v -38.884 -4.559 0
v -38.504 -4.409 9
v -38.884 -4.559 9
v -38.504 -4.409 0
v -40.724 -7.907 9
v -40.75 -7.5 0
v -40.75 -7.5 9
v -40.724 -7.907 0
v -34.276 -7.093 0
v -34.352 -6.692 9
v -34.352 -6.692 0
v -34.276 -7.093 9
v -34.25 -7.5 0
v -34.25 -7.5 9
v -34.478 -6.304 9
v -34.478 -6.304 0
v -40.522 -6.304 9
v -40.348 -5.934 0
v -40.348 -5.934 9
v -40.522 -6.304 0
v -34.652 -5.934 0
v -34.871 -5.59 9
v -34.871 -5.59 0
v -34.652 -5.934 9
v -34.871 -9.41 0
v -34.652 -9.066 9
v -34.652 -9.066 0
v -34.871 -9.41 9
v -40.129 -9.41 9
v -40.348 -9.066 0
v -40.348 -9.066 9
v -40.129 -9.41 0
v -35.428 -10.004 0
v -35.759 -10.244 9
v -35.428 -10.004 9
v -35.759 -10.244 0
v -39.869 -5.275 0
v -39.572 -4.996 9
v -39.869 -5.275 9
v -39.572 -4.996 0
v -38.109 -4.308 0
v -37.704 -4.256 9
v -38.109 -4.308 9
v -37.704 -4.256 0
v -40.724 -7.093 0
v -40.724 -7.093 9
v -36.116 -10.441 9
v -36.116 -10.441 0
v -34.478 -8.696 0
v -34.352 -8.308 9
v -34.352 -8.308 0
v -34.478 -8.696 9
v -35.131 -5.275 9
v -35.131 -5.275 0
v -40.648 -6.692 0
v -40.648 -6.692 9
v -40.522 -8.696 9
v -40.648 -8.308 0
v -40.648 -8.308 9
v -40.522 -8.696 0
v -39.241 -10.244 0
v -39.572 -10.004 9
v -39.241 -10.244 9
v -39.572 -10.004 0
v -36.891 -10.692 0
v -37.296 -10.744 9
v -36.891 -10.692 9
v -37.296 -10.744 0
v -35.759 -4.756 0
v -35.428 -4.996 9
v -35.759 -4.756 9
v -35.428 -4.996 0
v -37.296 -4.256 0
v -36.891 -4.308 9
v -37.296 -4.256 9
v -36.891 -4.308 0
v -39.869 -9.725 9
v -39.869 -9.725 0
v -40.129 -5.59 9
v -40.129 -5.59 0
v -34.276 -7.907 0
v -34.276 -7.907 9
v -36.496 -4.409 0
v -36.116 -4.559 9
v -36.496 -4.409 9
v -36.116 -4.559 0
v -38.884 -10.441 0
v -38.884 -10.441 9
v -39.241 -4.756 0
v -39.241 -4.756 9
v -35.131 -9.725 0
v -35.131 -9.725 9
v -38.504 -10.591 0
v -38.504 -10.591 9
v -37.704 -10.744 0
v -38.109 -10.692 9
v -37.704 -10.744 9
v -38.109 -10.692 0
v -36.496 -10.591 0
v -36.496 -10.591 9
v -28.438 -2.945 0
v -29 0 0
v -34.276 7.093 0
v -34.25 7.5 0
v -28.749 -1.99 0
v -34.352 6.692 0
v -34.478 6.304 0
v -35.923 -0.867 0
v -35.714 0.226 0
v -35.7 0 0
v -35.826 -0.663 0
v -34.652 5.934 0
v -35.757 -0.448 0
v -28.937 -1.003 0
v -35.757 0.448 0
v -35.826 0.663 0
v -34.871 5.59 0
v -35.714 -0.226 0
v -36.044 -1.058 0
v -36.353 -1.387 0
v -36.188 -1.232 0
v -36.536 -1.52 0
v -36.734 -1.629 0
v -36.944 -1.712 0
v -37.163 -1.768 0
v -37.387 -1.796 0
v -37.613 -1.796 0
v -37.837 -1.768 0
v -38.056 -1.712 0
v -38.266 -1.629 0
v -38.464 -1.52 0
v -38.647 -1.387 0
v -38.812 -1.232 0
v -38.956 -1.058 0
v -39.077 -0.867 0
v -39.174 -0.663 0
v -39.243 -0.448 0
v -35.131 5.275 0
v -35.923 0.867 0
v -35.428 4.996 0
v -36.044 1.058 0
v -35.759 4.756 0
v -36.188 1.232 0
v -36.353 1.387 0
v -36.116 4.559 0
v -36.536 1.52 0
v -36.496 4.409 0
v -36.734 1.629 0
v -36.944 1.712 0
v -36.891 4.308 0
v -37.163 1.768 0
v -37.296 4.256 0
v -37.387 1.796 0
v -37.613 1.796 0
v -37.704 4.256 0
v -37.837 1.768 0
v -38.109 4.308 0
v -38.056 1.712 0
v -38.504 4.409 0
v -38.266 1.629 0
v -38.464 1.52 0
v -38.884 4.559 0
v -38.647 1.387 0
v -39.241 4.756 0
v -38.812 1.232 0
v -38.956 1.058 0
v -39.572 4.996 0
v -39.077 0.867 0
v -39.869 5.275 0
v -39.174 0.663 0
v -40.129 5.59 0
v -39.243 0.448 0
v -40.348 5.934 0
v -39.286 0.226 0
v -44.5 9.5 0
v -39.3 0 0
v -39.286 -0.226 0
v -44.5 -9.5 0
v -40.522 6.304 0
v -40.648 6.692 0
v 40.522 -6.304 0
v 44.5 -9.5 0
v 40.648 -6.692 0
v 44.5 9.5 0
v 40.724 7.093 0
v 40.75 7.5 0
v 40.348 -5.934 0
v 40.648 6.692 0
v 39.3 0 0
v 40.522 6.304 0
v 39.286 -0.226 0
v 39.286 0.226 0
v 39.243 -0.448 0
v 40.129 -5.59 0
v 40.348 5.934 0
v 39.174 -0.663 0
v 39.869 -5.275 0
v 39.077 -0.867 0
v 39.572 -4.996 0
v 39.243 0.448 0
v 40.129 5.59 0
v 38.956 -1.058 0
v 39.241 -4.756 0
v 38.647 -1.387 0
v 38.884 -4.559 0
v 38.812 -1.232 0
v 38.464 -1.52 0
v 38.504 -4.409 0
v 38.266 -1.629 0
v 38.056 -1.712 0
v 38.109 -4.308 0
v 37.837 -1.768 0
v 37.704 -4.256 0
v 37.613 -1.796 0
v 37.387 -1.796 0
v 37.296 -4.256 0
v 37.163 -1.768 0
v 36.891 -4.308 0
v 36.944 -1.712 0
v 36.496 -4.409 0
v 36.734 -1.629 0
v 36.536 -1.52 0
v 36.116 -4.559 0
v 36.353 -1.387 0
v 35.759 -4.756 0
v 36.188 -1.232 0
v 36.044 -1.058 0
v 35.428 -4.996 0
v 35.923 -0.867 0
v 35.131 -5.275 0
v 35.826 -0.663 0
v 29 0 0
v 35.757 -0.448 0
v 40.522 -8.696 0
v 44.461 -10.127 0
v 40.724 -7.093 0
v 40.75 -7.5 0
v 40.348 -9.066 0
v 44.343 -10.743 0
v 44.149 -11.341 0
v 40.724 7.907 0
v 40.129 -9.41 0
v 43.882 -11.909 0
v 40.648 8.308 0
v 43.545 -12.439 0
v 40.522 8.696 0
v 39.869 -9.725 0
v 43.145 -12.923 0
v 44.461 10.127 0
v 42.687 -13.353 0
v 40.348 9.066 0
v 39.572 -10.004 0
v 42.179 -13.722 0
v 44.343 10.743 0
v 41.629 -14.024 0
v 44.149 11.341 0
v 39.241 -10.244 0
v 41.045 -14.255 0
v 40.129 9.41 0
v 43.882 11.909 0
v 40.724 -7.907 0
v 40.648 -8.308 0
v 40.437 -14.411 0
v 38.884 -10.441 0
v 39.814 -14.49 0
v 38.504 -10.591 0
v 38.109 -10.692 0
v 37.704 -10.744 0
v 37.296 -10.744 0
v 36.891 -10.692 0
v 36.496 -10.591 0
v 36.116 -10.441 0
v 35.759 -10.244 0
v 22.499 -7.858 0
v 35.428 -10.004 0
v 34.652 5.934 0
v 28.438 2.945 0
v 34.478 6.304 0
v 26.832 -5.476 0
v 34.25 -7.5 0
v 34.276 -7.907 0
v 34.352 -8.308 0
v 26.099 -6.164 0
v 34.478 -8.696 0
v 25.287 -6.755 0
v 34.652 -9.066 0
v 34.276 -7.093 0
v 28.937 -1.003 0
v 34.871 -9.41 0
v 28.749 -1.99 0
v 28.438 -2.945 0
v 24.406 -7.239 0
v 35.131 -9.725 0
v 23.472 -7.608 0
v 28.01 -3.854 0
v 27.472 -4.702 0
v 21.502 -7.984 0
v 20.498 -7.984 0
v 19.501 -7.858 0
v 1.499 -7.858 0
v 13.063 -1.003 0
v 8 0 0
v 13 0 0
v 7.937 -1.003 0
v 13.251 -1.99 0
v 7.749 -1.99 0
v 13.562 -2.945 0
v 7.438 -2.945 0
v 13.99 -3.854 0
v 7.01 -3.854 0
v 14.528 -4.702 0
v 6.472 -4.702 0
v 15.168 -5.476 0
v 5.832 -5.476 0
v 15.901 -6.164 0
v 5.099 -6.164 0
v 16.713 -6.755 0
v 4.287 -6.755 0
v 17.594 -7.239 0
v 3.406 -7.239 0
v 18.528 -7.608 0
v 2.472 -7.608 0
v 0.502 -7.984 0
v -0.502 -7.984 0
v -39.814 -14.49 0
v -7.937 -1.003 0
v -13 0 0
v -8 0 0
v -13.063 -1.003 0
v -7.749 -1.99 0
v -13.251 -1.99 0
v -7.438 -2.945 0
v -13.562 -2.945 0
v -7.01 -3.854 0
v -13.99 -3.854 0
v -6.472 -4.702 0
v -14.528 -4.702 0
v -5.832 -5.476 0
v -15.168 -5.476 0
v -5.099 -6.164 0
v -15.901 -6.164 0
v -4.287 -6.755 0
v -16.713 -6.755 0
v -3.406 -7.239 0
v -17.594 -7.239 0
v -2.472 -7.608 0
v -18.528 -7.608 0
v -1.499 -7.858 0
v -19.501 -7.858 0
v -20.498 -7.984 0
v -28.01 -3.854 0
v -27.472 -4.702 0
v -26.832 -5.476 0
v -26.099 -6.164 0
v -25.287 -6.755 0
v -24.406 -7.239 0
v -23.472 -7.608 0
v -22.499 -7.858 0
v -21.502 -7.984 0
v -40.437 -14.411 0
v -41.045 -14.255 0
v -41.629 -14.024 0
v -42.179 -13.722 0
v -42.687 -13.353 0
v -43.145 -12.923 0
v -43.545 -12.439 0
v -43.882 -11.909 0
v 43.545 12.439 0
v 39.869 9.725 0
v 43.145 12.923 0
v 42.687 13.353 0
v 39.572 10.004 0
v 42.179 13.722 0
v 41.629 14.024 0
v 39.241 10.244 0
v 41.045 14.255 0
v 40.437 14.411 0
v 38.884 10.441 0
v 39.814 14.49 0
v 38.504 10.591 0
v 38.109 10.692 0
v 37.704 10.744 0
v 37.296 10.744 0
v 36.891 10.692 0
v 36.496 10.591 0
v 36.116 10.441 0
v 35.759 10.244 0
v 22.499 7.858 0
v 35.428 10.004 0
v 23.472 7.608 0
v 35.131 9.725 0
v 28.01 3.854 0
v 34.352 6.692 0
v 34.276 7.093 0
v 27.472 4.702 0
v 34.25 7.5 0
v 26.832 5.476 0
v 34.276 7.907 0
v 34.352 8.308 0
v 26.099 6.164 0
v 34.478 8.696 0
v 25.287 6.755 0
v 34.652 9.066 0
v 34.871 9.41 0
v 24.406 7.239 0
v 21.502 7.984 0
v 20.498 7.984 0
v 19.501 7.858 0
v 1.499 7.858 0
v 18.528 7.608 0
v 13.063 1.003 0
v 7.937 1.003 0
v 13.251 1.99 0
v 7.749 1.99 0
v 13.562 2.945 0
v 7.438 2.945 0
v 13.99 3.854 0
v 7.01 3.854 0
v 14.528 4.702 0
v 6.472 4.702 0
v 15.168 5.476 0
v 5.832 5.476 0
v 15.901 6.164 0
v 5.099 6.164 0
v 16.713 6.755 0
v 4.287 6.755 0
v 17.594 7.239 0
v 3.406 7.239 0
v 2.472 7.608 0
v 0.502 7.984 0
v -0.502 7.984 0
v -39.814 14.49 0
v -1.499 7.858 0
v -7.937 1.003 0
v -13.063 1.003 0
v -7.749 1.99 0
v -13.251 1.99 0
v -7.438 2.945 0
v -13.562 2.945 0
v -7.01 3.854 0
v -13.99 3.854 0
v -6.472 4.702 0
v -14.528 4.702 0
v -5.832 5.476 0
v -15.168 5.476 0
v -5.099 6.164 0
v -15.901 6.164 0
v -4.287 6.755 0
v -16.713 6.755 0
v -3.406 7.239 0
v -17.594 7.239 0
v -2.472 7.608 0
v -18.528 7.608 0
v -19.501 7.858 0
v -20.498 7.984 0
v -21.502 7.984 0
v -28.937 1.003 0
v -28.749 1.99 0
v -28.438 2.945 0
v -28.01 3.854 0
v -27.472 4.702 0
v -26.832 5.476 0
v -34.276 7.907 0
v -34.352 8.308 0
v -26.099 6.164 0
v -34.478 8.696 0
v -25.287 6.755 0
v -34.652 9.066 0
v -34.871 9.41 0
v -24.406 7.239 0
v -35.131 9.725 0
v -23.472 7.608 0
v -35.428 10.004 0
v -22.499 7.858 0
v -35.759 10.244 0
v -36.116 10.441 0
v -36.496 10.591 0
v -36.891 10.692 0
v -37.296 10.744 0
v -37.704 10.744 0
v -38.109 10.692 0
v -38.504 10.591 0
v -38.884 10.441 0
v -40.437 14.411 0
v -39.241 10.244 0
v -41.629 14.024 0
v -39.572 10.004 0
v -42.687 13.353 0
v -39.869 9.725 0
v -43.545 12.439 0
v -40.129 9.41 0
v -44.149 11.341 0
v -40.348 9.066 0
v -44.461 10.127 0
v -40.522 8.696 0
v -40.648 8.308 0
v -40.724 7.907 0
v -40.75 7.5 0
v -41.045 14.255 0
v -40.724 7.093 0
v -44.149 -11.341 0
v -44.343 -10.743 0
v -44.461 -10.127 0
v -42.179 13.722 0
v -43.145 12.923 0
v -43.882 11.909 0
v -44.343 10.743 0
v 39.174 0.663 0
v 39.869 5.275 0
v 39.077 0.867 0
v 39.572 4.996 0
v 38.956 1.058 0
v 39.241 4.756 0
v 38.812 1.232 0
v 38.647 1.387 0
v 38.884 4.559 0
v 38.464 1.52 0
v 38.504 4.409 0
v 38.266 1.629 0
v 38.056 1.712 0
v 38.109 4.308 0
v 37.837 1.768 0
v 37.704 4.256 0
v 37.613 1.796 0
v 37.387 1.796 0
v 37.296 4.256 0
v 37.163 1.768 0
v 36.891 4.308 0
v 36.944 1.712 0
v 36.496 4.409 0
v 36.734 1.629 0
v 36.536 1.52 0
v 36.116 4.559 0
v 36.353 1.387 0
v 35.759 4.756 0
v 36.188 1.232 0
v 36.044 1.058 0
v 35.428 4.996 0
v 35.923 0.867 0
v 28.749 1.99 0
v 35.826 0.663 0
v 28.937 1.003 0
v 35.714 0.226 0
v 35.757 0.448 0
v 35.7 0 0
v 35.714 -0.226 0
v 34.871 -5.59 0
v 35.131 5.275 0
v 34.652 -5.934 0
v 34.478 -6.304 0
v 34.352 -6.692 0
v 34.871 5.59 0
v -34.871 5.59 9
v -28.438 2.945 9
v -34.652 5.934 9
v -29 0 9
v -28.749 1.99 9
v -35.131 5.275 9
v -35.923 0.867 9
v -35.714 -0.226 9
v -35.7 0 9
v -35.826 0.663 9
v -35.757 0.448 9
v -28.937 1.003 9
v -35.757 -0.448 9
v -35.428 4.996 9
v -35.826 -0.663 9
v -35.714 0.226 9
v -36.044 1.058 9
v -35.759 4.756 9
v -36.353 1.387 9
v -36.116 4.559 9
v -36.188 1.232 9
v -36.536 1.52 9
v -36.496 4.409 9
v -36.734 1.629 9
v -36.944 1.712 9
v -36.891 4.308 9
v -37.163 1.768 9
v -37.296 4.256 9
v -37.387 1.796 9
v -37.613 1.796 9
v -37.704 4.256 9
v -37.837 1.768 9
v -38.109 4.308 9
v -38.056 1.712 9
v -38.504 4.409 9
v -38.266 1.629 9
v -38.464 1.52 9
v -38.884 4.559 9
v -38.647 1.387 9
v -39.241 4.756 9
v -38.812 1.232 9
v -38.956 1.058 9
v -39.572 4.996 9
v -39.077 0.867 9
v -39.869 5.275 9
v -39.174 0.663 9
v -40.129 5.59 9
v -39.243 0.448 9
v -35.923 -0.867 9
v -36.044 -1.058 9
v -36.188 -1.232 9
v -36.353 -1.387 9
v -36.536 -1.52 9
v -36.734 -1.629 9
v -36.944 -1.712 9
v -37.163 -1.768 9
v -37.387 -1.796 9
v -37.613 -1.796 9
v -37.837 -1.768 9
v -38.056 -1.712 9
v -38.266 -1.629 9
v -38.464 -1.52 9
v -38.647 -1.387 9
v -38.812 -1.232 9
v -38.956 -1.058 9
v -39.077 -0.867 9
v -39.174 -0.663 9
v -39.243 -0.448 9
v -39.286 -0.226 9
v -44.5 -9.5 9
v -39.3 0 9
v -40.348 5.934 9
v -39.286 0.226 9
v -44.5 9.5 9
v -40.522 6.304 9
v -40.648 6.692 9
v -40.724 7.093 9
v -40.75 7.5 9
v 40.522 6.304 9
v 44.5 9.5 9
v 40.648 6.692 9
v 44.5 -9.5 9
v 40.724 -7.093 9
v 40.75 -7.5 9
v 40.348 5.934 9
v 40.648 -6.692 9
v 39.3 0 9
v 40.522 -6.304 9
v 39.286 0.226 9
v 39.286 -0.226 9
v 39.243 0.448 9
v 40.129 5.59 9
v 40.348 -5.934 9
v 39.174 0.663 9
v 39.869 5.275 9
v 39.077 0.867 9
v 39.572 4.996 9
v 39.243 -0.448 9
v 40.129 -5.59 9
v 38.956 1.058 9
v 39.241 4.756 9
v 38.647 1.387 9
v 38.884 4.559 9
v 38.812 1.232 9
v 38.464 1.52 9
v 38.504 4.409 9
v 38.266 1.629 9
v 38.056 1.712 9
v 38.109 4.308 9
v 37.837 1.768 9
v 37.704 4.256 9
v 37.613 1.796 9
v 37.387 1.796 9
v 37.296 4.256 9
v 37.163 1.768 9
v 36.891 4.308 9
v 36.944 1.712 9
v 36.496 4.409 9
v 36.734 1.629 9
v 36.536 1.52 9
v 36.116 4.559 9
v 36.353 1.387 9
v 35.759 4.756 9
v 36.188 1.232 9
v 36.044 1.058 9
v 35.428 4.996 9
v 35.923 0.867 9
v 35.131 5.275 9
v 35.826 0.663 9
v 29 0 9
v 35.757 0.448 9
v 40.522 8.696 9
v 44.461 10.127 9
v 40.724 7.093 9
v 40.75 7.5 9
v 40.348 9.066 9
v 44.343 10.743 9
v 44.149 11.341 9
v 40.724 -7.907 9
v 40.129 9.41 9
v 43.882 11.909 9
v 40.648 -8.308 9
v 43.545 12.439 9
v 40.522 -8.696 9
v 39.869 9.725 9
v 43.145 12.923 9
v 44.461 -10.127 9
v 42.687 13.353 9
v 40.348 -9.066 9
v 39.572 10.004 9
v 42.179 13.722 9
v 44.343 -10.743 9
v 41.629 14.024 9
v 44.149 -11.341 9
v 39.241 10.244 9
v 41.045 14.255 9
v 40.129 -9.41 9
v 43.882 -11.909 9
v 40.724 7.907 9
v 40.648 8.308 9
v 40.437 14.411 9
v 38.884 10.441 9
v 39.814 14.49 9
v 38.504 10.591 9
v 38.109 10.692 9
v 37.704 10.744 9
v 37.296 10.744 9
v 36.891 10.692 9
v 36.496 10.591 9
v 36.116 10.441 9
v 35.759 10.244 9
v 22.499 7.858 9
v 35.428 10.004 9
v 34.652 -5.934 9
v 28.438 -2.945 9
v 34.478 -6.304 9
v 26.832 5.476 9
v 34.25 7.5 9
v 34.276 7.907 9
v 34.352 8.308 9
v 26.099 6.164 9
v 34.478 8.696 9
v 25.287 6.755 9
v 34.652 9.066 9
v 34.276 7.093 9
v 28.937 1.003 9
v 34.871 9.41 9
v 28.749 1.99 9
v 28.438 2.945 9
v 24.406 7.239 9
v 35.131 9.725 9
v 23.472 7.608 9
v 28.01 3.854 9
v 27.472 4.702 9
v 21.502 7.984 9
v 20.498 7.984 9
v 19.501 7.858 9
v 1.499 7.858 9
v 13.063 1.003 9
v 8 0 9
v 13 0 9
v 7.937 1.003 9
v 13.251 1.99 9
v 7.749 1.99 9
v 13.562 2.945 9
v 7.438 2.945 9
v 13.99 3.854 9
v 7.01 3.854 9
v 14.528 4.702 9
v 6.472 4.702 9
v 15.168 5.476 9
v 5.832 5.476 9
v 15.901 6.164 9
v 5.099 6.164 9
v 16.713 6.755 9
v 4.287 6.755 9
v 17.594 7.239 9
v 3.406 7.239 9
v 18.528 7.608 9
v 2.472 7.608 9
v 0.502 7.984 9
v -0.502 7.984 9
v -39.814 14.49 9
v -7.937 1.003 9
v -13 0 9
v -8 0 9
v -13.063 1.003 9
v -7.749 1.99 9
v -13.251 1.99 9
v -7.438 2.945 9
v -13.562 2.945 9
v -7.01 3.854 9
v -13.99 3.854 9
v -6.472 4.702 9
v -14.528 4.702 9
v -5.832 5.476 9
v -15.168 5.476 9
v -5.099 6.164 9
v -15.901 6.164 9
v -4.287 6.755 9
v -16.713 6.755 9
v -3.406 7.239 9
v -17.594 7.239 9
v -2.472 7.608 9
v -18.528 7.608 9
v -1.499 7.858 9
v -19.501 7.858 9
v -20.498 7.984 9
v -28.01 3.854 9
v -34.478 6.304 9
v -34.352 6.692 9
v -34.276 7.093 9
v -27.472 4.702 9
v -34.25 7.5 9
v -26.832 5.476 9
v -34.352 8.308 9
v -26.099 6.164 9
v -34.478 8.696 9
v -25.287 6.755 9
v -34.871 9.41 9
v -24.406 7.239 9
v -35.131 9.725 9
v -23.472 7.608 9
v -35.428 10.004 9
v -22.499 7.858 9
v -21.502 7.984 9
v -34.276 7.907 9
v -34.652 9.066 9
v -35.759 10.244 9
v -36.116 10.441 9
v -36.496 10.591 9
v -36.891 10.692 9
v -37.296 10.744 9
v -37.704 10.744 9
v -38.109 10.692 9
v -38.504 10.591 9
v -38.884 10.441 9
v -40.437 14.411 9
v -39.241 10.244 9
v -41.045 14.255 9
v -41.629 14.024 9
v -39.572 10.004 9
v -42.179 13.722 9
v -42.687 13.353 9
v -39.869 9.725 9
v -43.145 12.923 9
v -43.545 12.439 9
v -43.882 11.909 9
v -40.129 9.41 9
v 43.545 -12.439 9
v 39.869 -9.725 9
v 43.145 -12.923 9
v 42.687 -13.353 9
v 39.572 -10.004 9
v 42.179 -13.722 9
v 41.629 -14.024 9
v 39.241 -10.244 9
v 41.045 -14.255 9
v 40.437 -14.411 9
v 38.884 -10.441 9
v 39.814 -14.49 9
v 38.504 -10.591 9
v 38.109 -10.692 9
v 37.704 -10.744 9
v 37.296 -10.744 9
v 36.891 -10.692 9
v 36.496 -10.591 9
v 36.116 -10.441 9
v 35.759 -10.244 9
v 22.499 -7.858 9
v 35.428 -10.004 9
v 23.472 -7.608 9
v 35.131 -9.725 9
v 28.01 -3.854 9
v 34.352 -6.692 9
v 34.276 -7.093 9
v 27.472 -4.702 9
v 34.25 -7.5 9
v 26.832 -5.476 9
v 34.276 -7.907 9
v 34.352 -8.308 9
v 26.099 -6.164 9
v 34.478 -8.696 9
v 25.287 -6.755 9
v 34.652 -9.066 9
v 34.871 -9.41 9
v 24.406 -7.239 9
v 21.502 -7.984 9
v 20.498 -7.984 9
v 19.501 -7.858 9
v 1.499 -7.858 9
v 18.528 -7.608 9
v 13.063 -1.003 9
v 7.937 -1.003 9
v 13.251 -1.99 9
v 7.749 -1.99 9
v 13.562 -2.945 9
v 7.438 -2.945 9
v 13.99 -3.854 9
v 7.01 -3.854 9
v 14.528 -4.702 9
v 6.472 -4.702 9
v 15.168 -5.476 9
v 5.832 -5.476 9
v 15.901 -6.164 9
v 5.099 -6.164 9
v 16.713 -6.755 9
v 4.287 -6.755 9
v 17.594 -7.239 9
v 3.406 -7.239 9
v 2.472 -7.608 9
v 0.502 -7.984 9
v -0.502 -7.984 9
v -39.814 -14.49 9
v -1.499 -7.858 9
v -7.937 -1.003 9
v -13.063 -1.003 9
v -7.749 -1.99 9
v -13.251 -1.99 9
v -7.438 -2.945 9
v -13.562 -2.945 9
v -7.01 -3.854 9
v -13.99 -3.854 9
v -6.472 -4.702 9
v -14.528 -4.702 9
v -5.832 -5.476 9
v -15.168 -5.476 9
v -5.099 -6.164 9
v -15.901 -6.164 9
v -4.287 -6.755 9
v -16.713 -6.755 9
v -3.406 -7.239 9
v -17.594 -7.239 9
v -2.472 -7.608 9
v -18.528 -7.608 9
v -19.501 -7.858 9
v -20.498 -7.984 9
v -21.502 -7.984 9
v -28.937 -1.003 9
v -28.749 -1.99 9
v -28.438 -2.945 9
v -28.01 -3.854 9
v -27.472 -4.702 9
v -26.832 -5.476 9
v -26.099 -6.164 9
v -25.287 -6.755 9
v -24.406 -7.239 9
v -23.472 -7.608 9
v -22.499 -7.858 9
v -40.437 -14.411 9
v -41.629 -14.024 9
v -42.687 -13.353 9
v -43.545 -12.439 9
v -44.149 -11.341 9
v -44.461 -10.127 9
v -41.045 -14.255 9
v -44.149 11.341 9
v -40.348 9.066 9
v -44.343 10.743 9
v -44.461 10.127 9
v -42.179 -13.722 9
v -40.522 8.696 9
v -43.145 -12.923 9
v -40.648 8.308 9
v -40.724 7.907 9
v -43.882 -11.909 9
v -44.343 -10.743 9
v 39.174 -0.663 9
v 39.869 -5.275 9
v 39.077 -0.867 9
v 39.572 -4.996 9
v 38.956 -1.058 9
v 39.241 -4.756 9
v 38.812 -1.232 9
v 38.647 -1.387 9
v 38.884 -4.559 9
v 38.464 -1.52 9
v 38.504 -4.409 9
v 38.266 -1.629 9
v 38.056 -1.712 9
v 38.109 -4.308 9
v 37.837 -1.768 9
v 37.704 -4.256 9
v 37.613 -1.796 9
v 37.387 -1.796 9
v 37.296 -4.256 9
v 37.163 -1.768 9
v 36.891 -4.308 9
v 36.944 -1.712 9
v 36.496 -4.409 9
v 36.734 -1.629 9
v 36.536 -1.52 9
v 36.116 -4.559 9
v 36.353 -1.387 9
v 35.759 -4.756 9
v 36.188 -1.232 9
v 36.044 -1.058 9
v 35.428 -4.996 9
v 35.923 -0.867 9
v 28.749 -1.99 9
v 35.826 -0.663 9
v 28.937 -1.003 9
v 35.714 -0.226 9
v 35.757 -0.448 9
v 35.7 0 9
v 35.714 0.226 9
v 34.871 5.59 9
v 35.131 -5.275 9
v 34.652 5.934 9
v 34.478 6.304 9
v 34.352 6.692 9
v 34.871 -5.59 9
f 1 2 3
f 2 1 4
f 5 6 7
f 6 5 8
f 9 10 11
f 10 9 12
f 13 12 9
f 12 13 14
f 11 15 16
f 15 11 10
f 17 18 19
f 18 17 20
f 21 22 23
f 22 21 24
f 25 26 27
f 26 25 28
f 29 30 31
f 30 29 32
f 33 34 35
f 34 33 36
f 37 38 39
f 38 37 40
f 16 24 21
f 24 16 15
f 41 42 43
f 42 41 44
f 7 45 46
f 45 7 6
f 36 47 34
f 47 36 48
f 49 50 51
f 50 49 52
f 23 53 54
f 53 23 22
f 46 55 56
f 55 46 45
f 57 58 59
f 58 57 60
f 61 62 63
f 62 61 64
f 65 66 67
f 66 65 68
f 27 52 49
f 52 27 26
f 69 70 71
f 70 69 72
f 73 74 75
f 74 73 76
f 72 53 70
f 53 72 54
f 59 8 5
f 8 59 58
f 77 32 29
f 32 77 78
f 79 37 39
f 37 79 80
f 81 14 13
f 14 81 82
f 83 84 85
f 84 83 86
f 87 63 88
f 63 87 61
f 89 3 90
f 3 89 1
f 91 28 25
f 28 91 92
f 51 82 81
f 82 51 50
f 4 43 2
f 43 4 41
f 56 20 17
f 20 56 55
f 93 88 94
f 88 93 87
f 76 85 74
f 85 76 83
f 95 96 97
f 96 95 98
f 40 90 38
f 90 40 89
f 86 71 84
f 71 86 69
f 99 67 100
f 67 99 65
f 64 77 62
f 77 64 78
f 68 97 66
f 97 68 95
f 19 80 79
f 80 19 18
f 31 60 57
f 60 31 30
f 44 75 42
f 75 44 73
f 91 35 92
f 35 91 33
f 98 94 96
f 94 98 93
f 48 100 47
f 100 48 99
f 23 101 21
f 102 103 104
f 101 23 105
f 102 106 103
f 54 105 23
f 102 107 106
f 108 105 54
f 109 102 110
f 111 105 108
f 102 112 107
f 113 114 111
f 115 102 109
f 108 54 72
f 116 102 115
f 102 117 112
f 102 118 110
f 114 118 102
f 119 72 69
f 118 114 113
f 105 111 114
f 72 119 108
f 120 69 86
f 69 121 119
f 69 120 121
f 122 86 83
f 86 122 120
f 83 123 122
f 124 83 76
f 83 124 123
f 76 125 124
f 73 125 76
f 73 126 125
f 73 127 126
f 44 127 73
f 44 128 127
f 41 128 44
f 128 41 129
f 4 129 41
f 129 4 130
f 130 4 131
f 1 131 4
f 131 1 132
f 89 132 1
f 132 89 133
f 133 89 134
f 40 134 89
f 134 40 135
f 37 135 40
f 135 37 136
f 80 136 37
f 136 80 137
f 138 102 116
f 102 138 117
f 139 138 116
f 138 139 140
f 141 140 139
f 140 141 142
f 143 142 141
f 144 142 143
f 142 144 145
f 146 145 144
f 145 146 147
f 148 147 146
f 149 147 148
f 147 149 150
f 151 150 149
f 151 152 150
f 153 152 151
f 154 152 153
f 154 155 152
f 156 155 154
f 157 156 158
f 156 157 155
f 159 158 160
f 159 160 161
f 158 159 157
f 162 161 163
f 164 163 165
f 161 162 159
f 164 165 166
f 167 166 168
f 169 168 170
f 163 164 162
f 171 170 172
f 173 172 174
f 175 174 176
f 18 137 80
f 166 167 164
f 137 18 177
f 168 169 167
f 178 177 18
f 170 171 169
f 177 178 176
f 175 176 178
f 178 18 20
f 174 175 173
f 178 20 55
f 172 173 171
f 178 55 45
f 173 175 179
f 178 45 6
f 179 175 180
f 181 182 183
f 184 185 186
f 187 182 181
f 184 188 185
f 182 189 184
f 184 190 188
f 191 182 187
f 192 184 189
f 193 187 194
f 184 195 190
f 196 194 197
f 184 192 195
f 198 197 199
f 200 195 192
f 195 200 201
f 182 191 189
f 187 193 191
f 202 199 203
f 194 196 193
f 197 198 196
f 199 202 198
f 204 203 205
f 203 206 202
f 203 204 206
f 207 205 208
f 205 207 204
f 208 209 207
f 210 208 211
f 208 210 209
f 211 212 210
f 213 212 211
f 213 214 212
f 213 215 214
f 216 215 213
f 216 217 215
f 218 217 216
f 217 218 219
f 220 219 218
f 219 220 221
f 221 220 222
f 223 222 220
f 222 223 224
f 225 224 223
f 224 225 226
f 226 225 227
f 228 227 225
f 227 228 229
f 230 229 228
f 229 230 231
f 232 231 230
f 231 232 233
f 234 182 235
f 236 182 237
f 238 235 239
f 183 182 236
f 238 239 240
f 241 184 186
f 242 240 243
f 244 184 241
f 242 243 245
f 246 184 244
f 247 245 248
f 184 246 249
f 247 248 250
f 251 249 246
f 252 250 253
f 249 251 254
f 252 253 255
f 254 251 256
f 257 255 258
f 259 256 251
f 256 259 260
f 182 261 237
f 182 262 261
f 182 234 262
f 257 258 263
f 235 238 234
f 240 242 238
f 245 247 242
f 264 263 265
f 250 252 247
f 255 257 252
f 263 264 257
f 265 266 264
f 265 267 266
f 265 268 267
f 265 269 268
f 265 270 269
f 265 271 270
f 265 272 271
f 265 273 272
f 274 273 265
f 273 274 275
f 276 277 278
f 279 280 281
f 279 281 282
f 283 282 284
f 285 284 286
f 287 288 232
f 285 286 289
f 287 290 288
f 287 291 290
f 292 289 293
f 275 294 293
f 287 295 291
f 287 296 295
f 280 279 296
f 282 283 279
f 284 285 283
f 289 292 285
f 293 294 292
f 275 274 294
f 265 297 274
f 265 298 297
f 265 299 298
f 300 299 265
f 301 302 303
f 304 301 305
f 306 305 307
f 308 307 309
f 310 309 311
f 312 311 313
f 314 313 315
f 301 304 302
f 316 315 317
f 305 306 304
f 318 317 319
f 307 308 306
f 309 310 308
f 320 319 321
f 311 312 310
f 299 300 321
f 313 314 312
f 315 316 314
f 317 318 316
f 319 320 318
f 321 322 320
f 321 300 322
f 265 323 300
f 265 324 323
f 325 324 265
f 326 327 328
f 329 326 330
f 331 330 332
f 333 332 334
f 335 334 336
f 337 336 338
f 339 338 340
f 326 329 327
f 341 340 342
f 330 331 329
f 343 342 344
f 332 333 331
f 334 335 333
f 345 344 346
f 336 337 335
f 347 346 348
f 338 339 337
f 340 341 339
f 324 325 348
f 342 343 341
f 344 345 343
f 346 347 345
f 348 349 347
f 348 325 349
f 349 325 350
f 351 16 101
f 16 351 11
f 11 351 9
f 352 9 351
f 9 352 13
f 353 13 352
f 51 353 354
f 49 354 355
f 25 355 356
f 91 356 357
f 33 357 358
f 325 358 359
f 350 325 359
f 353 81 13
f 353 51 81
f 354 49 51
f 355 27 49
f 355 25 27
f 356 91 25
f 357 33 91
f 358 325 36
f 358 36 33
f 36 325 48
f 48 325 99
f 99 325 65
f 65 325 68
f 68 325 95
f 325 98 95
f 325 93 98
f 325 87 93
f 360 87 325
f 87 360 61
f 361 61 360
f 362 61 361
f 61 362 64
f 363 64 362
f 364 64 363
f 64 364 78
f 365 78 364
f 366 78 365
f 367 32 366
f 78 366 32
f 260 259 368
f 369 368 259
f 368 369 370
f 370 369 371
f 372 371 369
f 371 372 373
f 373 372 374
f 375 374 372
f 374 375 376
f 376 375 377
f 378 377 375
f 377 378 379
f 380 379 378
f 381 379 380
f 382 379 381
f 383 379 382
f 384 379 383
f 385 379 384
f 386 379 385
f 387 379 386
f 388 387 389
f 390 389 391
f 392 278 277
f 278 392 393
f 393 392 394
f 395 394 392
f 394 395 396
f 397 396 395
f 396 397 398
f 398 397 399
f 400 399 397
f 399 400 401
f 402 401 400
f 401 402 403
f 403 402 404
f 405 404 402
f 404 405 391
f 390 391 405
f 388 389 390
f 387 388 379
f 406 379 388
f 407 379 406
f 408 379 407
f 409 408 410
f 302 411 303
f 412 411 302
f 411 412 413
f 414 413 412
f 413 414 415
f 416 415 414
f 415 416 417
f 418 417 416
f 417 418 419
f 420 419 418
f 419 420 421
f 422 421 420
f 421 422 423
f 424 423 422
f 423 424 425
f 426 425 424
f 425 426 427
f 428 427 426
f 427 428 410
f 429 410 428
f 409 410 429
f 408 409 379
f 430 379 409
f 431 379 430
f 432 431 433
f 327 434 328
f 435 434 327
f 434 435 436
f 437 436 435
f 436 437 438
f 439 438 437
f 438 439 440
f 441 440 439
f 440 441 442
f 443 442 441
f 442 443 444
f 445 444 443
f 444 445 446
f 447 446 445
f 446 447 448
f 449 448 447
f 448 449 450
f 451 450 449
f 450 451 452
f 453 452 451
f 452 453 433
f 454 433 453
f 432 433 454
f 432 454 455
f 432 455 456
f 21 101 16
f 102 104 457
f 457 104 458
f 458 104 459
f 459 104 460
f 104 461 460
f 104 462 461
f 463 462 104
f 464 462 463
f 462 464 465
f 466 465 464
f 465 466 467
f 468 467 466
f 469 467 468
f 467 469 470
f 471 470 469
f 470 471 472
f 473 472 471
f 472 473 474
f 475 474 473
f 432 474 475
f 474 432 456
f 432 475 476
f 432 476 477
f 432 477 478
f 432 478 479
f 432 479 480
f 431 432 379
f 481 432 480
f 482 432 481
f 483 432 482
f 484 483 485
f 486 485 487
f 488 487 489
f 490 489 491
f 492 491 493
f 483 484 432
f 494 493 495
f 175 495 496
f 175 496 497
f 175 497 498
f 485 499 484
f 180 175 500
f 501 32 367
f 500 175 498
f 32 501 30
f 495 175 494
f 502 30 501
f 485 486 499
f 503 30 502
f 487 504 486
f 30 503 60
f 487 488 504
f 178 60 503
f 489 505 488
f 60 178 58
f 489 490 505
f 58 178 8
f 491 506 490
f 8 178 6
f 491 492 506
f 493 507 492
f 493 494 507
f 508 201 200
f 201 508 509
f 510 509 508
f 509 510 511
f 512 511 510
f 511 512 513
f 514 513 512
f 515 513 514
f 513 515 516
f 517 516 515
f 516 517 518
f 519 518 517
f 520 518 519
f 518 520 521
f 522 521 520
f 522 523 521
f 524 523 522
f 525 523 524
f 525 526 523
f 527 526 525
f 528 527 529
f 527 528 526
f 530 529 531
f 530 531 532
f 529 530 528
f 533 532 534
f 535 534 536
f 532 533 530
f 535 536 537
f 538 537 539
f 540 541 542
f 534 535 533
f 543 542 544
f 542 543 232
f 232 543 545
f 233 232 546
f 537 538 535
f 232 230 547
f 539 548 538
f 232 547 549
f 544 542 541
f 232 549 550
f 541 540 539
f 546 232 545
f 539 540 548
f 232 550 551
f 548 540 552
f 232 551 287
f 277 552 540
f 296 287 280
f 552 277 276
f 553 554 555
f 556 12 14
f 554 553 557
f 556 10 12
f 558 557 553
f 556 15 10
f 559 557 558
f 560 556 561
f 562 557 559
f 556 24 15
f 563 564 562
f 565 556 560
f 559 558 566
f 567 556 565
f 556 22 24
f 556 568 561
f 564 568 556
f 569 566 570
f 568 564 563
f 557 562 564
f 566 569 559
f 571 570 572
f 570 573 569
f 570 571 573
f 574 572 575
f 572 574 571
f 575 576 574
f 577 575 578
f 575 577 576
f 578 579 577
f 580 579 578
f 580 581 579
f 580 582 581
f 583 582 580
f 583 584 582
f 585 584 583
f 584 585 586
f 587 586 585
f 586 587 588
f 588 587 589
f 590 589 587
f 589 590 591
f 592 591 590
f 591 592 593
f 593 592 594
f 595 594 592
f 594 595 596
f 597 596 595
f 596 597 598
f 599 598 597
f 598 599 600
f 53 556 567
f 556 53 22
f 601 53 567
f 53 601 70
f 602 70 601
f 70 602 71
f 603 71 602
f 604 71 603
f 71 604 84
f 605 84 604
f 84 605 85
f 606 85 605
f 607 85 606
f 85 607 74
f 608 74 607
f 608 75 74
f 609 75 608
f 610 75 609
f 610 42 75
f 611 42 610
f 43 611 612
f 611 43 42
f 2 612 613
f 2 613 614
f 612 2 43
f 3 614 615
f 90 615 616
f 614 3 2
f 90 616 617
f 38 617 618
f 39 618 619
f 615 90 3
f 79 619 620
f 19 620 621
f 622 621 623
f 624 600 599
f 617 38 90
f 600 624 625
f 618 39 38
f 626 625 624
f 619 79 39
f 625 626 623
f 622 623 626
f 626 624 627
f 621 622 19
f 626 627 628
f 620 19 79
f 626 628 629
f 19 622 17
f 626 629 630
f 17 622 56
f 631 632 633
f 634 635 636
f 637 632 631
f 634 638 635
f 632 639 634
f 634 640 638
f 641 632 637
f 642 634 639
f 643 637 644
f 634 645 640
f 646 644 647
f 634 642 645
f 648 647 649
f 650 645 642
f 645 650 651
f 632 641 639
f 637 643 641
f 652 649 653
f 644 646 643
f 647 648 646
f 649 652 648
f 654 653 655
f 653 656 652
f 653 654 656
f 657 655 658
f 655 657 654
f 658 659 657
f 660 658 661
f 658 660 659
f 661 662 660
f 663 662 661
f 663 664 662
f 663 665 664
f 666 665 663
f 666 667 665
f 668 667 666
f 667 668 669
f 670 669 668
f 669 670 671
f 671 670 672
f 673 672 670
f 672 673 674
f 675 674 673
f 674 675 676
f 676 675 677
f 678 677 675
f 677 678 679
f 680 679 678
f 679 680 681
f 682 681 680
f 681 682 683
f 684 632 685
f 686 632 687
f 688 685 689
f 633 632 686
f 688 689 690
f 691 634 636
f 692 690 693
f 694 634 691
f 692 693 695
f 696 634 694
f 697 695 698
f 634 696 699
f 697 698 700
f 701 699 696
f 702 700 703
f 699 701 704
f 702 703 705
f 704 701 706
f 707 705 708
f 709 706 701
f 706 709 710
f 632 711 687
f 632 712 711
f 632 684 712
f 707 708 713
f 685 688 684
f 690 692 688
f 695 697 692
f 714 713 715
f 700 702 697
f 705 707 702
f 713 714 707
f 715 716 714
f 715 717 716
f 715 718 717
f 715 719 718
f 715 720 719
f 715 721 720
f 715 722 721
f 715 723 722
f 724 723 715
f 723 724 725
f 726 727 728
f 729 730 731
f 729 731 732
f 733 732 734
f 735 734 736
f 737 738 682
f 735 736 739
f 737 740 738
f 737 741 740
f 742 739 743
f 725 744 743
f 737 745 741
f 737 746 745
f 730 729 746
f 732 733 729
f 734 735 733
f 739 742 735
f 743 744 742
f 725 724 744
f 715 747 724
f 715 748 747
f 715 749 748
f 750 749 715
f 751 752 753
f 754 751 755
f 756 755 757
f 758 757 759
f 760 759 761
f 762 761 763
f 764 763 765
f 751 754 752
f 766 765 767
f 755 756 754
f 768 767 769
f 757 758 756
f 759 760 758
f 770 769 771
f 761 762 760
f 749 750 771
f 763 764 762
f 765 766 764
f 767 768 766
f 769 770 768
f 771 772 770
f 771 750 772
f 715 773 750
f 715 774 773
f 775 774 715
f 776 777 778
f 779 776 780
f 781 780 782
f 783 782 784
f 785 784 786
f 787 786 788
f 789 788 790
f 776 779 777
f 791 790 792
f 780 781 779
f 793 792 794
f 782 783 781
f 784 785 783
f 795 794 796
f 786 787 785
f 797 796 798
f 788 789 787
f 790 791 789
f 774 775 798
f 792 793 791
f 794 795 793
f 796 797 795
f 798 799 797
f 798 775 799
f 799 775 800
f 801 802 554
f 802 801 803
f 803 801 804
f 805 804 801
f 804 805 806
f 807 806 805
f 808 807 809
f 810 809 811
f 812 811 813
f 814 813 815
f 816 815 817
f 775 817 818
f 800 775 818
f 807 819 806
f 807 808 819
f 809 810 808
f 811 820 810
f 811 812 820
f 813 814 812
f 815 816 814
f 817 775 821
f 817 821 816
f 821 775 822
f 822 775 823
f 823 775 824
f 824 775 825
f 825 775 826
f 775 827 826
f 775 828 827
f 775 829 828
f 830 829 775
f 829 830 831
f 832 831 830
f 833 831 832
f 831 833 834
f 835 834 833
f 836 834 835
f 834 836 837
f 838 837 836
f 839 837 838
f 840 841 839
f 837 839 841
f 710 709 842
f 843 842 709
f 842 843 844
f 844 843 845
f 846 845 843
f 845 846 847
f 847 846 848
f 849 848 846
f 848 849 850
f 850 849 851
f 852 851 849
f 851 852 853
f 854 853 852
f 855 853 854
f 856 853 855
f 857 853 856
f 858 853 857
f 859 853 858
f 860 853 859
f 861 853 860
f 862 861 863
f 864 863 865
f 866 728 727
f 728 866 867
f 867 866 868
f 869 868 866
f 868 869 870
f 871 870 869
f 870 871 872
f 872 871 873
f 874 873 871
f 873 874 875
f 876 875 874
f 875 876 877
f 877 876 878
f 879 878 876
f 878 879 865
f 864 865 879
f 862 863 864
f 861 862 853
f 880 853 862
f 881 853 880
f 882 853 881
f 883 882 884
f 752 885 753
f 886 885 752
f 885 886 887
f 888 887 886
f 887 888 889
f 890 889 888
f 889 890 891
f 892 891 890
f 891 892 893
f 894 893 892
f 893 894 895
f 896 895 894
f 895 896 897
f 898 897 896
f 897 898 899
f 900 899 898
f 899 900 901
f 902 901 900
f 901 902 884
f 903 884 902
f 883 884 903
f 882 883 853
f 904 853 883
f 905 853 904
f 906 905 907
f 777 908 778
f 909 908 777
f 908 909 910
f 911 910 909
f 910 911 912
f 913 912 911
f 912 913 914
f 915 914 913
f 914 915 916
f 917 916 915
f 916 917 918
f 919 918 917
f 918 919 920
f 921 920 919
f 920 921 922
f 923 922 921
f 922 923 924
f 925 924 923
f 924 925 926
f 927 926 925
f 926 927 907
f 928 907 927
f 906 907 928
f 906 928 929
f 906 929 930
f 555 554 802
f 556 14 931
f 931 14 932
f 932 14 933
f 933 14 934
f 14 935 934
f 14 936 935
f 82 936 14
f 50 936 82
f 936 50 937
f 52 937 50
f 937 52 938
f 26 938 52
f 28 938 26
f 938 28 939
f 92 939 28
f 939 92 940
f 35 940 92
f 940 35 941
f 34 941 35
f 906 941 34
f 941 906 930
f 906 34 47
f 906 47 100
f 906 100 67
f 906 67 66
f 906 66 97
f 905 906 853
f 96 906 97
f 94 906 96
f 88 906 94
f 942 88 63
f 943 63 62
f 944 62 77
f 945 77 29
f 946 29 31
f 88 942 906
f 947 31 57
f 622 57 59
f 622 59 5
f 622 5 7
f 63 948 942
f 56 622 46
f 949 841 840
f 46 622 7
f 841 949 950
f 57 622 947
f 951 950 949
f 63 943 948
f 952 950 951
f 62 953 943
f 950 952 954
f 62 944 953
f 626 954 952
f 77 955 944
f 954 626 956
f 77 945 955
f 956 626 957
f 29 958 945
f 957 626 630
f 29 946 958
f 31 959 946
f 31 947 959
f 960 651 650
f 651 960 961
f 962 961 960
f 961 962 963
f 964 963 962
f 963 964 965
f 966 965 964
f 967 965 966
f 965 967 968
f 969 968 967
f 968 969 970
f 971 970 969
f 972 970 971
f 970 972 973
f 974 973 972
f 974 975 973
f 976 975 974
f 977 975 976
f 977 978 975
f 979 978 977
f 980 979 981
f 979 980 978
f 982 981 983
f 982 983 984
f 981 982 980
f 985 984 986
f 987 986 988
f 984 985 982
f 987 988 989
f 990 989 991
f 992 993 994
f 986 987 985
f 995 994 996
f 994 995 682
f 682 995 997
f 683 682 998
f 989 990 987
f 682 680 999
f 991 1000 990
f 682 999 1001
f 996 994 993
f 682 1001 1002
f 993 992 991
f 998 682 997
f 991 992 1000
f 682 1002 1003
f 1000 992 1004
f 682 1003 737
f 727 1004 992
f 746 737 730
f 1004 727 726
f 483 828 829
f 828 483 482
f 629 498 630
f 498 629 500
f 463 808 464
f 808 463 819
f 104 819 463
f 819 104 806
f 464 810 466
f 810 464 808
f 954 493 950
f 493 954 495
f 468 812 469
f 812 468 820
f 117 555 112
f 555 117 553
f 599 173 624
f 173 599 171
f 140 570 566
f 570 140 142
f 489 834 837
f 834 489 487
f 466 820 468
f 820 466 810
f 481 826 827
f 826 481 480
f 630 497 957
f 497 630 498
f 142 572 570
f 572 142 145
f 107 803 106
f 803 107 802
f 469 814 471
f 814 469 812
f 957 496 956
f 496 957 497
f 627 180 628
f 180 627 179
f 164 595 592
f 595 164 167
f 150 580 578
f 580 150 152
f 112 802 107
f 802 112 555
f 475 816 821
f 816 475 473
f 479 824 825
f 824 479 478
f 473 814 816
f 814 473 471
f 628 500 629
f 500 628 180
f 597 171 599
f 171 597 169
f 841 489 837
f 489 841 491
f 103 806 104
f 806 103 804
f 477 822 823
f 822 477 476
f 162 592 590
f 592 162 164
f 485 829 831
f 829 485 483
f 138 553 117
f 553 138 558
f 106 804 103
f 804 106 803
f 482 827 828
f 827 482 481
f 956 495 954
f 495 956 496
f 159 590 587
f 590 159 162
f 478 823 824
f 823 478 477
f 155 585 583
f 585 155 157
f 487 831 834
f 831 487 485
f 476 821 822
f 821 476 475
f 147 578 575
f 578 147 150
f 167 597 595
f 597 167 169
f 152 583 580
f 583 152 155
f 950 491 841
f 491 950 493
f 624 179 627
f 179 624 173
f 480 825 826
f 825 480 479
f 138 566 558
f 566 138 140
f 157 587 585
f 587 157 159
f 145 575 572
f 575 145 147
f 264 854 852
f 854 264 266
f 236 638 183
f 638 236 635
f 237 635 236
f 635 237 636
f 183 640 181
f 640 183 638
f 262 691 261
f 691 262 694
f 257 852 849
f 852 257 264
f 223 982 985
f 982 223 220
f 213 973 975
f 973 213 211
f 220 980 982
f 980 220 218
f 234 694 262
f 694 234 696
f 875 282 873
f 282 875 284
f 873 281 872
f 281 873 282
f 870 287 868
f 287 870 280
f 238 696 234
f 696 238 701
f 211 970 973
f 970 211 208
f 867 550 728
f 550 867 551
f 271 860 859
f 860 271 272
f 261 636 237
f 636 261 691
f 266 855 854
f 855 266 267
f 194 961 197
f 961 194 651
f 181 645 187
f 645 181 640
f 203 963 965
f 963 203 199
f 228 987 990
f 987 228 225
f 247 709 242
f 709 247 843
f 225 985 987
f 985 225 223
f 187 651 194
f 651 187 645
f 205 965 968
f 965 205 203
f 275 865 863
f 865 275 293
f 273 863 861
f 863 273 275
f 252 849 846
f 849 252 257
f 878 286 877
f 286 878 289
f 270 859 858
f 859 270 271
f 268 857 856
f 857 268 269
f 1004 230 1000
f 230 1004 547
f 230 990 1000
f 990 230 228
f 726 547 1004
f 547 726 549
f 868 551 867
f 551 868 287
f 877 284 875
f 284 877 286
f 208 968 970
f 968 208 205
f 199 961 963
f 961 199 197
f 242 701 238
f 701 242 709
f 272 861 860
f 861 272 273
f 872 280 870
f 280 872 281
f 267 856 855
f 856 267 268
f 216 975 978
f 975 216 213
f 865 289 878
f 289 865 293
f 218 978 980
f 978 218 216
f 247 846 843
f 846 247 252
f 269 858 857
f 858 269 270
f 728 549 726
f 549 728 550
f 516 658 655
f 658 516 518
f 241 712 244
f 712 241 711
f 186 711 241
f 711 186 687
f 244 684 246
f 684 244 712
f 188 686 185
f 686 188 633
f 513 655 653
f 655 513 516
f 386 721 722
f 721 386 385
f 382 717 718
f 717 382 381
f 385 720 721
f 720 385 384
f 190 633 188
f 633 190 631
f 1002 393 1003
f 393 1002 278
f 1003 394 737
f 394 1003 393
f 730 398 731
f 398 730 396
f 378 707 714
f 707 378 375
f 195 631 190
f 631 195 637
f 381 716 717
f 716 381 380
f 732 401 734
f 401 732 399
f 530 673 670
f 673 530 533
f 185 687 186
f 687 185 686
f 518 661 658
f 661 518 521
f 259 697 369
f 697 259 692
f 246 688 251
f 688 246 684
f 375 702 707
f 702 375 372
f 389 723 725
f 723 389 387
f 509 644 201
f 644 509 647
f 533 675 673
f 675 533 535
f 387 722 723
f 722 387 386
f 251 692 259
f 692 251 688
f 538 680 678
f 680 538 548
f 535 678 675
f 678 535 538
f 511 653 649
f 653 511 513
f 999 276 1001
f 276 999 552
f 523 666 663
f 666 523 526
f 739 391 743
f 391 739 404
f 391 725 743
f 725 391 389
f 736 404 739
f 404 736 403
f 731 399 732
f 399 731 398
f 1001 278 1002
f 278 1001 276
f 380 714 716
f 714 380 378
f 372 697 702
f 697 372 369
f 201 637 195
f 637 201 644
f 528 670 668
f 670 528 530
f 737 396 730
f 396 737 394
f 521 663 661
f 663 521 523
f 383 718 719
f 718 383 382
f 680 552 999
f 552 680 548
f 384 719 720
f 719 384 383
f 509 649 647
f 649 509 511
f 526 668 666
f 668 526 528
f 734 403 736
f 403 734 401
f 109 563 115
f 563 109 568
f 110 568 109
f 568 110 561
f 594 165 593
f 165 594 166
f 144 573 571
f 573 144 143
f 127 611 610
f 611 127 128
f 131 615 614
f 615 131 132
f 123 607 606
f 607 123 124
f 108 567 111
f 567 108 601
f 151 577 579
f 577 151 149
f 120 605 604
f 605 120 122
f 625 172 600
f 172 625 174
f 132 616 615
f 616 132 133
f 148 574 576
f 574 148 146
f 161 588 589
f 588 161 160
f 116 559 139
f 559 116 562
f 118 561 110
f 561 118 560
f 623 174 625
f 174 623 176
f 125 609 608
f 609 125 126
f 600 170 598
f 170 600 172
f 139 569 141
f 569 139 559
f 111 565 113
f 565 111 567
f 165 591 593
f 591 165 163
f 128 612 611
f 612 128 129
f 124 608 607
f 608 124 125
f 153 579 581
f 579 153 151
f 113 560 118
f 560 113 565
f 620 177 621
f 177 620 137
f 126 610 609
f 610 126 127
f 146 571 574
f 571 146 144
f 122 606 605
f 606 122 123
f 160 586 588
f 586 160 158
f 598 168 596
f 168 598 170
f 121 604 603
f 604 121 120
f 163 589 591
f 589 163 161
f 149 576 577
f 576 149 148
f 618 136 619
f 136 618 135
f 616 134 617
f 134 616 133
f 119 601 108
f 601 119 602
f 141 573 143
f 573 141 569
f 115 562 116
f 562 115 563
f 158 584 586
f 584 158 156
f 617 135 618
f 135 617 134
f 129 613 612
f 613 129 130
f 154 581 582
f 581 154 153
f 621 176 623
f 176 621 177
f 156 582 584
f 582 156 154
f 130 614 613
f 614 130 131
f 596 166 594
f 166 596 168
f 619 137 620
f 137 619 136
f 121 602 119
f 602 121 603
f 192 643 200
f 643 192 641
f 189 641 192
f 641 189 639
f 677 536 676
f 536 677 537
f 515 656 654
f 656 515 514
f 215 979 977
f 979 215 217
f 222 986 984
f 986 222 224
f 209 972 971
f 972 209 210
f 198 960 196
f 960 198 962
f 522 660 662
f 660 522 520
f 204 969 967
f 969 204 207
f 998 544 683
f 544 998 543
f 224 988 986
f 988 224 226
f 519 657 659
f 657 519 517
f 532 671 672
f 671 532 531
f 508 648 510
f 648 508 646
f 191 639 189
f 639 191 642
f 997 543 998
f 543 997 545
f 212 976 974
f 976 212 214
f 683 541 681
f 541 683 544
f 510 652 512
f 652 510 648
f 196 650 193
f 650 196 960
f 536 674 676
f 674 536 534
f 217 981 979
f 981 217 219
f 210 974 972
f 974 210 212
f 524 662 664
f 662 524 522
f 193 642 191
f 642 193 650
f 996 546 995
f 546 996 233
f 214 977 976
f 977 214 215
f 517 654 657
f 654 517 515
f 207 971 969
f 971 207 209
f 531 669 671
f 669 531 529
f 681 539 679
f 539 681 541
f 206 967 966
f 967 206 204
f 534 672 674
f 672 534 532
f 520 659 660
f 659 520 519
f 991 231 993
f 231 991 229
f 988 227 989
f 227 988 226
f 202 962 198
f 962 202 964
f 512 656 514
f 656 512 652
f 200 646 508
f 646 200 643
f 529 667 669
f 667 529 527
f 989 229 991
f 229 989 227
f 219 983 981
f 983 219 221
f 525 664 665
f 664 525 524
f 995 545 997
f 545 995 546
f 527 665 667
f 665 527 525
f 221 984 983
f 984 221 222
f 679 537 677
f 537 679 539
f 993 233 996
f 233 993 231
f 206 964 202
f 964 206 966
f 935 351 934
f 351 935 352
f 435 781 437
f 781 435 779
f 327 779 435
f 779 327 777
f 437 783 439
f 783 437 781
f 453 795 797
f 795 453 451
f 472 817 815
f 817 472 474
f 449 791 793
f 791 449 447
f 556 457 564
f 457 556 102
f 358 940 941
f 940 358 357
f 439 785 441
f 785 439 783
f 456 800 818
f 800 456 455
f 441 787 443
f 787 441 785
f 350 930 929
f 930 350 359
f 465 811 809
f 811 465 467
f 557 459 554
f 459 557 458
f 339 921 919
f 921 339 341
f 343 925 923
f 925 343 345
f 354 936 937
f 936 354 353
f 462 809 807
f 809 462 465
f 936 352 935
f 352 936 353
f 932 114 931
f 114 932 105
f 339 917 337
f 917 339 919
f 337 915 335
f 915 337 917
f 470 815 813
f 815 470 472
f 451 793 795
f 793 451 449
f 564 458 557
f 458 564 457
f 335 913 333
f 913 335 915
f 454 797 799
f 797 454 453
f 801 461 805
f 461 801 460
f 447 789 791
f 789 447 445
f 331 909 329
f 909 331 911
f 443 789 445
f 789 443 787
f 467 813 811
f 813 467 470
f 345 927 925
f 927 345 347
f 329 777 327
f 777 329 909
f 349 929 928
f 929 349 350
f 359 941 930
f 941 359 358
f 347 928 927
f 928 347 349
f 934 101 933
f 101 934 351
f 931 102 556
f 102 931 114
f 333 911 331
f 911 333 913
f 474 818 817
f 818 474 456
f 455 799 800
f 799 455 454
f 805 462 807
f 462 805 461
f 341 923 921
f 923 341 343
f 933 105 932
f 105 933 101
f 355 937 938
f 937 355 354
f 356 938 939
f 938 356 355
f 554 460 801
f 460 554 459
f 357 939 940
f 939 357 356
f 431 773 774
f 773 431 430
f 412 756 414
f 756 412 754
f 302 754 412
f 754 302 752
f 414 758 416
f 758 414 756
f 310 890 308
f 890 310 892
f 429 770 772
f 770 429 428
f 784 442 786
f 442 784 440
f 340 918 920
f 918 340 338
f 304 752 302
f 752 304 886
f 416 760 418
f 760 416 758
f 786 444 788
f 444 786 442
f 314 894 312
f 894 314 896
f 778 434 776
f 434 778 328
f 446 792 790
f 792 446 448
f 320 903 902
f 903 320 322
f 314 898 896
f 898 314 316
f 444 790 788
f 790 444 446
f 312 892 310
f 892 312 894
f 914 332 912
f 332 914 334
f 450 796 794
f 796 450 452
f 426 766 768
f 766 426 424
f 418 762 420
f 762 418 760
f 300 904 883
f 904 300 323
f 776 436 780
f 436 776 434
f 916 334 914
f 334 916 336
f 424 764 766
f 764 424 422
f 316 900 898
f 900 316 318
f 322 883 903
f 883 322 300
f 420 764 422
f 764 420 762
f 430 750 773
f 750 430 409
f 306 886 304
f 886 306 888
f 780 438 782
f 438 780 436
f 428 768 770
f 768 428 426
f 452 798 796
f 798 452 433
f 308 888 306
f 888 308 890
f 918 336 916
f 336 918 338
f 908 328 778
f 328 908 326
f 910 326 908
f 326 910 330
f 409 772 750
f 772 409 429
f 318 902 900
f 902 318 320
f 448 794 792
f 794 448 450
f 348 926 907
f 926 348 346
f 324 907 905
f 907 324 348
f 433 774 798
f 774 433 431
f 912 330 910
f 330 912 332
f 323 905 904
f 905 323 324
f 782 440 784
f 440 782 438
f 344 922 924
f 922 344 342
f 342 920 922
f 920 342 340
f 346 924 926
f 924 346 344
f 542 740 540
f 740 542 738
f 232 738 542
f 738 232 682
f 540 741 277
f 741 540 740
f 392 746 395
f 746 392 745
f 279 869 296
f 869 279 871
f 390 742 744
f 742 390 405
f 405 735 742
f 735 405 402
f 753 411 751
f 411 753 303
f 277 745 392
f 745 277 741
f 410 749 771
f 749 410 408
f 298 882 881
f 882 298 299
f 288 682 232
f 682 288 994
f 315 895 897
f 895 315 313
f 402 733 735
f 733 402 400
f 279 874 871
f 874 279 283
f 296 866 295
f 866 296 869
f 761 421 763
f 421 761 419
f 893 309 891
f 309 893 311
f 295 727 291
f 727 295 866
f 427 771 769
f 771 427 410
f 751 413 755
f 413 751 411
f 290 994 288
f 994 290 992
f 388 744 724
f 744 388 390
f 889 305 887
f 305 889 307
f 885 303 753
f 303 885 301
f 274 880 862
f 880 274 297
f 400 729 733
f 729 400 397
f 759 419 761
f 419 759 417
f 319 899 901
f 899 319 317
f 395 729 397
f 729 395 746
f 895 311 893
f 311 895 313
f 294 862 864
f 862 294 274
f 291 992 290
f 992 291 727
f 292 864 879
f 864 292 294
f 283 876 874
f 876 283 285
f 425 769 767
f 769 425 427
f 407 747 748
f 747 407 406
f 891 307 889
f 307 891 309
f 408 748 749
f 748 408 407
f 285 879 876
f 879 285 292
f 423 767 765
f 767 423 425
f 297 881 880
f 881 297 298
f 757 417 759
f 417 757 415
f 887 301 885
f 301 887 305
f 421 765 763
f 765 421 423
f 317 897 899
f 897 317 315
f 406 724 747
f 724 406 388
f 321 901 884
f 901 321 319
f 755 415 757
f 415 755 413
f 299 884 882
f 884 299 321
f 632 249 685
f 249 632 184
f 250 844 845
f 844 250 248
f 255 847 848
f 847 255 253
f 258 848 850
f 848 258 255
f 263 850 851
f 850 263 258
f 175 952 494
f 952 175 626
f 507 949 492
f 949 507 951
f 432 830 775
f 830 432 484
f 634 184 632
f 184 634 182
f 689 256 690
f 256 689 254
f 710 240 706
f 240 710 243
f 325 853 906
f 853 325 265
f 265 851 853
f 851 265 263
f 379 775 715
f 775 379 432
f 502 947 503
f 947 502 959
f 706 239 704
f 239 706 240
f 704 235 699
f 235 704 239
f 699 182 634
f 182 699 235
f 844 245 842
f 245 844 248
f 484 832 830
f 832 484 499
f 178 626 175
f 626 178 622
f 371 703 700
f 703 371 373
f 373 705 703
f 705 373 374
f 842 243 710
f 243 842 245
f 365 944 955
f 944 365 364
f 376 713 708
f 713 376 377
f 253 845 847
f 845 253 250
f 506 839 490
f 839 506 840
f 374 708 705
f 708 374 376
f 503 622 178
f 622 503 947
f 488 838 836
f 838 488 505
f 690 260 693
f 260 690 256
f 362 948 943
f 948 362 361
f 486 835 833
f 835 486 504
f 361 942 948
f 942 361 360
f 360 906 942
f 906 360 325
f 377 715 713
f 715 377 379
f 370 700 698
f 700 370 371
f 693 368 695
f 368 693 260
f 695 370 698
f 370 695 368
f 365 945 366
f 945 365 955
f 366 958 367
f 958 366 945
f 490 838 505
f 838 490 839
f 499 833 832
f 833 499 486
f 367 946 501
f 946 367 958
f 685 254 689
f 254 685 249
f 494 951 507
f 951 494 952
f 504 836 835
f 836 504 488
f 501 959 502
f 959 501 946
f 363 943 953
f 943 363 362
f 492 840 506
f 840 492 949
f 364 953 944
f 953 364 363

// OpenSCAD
$fn = 50;

difference() {
	union() {
		hull() {
			translate(v = [-39.5, 9.5, 0]) {
				cylinder(h = 9, r = 5);
			}
			translate(v = [39.5, 9.5, 0]) {
				cylinder(h = 9, r = 5);
			}
			translate(v = [-39.5, -9.5, 0]) {
				cylinder(h = 9, r = 5);
			}
			translate(v = [39.5, -9.5, 0]) {
				cylinder(h = 9, r = 5);
			}
		}
	}
	union() {
		translate(v = [-37.5, -7.5, 0]) {
			cylinder(h = 9, r = 3.25);
		}
		translate(v = [-37.5, 7.5, 0]) {
			cylinder(h = 9, r = 3.25);
		}
		translate(v = [37.5, -7.5, 0]) {
			cylinder(h = 9, r = 3.25);
		}
		translate(v = [37.5, 7.5, 0]) {
			cylinder(h = 9, r = 3.25);
		}
		translate(v = [-37.5, 0.0, 0]) {
			cylinder(h = 9, r = 1.8);
		}
		translate(v = [37.5, 0.0, 0]) {
			cylinder(h = 9, r = 1.8);
		}
		translate(v = [-21.0, 0, 0.0]) {
			cylinder(h = 9, r = 8.0);
		}
		cylinder(h = 9, r = 8.0);
		translate(v = [21.0, 0, 0.0]) {
			cylinder(h = 9, r = 8.0);
		}
	}
}
